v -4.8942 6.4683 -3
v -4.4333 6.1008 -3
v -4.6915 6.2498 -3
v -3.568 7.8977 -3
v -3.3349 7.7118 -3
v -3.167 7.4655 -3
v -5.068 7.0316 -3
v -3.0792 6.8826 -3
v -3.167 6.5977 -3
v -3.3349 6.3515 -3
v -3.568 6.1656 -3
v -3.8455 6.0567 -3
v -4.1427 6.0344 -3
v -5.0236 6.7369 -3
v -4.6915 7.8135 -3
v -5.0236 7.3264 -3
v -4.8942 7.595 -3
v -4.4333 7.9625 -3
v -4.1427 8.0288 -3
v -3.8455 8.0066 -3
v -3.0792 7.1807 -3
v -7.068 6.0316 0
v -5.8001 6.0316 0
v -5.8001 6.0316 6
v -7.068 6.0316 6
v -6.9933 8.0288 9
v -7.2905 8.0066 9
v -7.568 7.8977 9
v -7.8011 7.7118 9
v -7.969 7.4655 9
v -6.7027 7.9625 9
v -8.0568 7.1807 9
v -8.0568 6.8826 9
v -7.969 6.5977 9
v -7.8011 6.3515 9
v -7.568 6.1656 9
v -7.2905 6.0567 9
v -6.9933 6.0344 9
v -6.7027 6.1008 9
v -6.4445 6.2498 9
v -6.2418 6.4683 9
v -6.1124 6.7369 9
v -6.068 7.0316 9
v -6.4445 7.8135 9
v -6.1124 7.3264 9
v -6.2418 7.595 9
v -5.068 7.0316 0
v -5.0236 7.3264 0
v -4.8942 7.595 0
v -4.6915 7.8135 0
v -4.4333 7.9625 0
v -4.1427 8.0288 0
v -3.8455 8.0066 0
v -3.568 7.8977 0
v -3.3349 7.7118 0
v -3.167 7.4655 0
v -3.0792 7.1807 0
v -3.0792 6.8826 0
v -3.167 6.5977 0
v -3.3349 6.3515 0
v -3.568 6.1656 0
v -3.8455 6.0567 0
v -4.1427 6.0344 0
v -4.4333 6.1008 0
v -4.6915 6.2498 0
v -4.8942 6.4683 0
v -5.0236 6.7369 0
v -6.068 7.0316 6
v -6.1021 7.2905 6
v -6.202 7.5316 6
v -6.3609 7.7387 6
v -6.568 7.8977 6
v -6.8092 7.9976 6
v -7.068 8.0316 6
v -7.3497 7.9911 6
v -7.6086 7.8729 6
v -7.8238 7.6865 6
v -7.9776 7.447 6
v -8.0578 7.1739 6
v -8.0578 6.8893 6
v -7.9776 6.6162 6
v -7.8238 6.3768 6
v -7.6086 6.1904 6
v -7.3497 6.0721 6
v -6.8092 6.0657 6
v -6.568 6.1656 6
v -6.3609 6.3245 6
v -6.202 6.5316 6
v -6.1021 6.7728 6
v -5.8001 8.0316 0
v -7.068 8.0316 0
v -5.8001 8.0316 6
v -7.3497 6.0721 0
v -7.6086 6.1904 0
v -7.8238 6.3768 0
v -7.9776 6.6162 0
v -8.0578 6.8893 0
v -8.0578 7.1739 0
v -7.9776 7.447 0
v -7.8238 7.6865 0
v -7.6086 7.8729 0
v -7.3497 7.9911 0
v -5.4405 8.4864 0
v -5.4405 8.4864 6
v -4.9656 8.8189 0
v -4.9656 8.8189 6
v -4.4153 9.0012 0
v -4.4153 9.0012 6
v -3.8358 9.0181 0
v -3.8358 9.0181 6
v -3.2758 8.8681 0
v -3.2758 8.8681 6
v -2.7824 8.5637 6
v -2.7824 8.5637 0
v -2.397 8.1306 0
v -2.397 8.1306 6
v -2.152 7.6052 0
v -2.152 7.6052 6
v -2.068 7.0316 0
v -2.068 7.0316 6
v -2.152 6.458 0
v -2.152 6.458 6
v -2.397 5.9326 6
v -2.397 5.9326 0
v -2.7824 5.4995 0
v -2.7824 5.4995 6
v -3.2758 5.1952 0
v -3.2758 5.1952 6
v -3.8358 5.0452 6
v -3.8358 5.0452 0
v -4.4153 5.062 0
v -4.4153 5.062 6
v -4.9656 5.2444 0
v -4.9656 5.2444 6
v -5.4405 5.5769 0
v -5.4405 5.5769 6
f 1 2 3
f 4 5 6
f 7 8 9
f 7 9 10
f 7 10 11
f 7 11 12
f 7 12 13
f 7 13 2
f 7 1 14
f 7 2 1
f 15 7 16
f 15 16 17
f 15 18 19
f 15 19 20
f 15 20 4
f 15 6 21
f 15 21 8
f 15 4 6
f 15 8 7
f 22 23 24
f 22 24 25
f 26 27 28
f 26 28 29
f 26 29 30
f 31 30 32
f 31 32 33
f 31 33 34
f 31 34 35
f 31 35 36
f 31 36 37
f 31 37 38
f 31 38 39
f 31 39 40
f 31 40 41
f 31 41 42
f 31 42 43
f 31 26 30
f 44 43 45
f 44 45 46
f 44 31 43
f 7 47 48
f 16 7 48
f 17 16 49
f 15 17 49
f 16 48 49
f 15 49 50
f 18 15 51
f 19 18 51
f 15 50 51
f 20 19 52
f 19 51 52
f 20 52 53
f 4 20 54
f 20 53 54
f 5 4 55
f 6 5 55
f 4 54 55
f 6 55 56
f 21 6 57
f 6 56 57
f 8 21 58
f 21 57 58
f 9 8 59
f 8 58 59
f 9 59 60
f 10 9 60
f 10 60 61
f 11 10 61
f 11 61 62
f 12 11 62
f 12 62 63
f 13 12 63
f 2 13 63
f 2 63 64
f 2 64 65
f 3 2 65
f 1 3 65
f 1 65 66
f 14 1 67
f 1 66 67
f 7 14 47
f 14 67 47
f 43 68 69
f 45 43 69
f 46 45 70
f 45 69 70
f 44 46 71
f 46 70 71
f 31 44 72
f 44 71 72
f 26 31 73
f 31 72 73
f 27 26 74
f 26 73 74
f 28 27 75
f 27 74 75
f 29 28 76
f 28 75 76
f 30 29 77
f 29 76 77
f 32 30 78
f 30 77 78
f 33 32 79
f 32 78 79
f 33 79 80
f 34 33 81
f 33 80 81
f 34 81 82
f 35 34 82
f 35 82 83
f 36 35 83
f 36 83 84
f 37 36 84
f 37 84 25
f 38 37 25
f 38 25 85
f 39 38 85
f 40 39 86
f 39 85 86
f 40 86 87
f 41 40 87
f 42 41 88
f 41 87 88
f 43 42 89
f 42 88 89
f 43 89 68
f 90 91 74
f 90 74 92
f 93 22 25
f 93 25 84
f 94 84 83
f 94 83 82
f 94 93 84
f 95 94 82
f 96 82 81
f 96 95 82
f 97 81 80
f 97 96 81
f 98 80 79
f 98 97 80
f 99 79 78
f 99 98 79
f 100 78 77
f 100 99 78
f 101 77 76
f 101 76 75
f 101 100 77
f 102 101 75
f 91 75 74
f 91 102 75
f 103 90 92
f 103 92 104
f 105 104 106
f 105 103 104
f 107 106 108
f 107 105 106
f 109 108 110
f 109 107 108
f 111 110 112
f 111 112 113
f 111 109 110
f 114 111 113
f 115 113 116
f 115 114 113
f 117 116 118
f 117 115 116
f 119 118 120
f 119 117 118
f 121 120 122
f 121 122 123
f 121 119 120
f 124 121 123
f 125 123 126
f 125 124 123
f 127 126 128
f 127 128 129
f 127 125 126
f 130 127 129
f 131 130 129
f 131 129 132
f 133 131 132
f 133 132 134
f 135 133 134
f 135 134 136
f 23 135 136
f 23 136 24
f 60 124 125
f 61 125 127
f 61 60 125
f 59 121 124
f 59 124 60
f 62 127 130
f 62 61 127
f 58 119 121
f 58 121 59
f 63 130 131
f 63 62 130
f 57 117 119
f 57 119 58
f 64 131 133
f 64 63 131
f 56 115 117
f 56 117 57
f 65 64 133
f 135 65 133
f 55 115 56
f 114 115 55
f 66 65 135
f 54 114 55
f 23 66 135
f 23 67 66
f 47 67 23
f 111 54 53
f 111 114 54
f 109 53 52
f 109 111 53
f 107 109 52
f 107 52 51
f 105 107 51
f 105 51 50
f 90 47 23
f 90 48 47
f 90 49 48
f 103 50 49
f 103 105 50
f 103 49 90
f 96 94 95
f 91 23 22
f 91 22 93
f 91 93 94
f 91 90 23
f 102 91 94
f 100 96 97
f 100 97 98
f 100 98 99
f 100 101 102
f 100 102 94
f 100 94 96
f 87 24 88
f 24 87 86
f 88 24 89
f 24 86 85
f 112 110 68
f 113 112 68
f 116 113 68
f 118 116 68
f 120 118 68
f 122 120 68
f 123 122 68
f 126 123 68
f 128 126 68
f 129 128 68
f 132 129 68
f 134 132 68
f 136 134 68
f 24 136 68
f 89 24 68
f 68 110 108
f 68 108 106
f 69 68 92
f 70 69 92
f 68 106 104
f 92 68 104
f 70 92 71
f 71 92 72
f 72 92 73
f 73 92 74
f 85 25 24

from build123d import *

# Parameters (mm, degrees)
BOSS_EXTRUDE1_DEPTH = 6
SKETCH2_R           = 1
BOSS_EXTRUDE2_DEPTH = 3
SKETCH3_R           = 1
BOSS_EXTRUDE3_DEPTH = 3


with BuildPart() as part:
    # Sketch1 → Boss-Extrude1 (new body)
    with BuildSketch(Plane.XY):
        with BuildLine():
            Line((-7.068000803, 8.031631057), (-5.800051611, 8.031631057))
            ThreePointArc((-5.800051611, 8.031631057), (-2.068000803, 7.031631057), (-5.800051611, 6.031631057))
            Line((-5.800051611, 6.031631057), (-7.068000803, 6.031631057))
            ThreePointArc((-7.068000803, 6.031631057), (-8.068000803, 7.031631057), (-7.068000803, 8.031631057))
        make_face()
    extrude(amount=BOSS_EXTRUDE1_DEPTH)

    # Sketch2 → Boss-Extrude2 (add)
    with BuildSketch(Plane.XY.offset(6)):
        with Locations((-7.068000803, 7.031631057)):
            Circle(SKETCH2_R)
    extrude(amount=BOSS_EXTRUDE2_DEPTH)

    # Sketch3 → Boss-Extrude3 (add)
    with BuildSketch(Plane(origin=(0, 0, 0), x_dir=(-1, 0, 0), z_dir=(0, 0, -1))):
        with Locations((4.068000803, 7.031631057)):
            Circle(SKETCH3_R)
    extrude(amount=BOSS_EXTRUDE3_DEPTH)


solid = part.part
